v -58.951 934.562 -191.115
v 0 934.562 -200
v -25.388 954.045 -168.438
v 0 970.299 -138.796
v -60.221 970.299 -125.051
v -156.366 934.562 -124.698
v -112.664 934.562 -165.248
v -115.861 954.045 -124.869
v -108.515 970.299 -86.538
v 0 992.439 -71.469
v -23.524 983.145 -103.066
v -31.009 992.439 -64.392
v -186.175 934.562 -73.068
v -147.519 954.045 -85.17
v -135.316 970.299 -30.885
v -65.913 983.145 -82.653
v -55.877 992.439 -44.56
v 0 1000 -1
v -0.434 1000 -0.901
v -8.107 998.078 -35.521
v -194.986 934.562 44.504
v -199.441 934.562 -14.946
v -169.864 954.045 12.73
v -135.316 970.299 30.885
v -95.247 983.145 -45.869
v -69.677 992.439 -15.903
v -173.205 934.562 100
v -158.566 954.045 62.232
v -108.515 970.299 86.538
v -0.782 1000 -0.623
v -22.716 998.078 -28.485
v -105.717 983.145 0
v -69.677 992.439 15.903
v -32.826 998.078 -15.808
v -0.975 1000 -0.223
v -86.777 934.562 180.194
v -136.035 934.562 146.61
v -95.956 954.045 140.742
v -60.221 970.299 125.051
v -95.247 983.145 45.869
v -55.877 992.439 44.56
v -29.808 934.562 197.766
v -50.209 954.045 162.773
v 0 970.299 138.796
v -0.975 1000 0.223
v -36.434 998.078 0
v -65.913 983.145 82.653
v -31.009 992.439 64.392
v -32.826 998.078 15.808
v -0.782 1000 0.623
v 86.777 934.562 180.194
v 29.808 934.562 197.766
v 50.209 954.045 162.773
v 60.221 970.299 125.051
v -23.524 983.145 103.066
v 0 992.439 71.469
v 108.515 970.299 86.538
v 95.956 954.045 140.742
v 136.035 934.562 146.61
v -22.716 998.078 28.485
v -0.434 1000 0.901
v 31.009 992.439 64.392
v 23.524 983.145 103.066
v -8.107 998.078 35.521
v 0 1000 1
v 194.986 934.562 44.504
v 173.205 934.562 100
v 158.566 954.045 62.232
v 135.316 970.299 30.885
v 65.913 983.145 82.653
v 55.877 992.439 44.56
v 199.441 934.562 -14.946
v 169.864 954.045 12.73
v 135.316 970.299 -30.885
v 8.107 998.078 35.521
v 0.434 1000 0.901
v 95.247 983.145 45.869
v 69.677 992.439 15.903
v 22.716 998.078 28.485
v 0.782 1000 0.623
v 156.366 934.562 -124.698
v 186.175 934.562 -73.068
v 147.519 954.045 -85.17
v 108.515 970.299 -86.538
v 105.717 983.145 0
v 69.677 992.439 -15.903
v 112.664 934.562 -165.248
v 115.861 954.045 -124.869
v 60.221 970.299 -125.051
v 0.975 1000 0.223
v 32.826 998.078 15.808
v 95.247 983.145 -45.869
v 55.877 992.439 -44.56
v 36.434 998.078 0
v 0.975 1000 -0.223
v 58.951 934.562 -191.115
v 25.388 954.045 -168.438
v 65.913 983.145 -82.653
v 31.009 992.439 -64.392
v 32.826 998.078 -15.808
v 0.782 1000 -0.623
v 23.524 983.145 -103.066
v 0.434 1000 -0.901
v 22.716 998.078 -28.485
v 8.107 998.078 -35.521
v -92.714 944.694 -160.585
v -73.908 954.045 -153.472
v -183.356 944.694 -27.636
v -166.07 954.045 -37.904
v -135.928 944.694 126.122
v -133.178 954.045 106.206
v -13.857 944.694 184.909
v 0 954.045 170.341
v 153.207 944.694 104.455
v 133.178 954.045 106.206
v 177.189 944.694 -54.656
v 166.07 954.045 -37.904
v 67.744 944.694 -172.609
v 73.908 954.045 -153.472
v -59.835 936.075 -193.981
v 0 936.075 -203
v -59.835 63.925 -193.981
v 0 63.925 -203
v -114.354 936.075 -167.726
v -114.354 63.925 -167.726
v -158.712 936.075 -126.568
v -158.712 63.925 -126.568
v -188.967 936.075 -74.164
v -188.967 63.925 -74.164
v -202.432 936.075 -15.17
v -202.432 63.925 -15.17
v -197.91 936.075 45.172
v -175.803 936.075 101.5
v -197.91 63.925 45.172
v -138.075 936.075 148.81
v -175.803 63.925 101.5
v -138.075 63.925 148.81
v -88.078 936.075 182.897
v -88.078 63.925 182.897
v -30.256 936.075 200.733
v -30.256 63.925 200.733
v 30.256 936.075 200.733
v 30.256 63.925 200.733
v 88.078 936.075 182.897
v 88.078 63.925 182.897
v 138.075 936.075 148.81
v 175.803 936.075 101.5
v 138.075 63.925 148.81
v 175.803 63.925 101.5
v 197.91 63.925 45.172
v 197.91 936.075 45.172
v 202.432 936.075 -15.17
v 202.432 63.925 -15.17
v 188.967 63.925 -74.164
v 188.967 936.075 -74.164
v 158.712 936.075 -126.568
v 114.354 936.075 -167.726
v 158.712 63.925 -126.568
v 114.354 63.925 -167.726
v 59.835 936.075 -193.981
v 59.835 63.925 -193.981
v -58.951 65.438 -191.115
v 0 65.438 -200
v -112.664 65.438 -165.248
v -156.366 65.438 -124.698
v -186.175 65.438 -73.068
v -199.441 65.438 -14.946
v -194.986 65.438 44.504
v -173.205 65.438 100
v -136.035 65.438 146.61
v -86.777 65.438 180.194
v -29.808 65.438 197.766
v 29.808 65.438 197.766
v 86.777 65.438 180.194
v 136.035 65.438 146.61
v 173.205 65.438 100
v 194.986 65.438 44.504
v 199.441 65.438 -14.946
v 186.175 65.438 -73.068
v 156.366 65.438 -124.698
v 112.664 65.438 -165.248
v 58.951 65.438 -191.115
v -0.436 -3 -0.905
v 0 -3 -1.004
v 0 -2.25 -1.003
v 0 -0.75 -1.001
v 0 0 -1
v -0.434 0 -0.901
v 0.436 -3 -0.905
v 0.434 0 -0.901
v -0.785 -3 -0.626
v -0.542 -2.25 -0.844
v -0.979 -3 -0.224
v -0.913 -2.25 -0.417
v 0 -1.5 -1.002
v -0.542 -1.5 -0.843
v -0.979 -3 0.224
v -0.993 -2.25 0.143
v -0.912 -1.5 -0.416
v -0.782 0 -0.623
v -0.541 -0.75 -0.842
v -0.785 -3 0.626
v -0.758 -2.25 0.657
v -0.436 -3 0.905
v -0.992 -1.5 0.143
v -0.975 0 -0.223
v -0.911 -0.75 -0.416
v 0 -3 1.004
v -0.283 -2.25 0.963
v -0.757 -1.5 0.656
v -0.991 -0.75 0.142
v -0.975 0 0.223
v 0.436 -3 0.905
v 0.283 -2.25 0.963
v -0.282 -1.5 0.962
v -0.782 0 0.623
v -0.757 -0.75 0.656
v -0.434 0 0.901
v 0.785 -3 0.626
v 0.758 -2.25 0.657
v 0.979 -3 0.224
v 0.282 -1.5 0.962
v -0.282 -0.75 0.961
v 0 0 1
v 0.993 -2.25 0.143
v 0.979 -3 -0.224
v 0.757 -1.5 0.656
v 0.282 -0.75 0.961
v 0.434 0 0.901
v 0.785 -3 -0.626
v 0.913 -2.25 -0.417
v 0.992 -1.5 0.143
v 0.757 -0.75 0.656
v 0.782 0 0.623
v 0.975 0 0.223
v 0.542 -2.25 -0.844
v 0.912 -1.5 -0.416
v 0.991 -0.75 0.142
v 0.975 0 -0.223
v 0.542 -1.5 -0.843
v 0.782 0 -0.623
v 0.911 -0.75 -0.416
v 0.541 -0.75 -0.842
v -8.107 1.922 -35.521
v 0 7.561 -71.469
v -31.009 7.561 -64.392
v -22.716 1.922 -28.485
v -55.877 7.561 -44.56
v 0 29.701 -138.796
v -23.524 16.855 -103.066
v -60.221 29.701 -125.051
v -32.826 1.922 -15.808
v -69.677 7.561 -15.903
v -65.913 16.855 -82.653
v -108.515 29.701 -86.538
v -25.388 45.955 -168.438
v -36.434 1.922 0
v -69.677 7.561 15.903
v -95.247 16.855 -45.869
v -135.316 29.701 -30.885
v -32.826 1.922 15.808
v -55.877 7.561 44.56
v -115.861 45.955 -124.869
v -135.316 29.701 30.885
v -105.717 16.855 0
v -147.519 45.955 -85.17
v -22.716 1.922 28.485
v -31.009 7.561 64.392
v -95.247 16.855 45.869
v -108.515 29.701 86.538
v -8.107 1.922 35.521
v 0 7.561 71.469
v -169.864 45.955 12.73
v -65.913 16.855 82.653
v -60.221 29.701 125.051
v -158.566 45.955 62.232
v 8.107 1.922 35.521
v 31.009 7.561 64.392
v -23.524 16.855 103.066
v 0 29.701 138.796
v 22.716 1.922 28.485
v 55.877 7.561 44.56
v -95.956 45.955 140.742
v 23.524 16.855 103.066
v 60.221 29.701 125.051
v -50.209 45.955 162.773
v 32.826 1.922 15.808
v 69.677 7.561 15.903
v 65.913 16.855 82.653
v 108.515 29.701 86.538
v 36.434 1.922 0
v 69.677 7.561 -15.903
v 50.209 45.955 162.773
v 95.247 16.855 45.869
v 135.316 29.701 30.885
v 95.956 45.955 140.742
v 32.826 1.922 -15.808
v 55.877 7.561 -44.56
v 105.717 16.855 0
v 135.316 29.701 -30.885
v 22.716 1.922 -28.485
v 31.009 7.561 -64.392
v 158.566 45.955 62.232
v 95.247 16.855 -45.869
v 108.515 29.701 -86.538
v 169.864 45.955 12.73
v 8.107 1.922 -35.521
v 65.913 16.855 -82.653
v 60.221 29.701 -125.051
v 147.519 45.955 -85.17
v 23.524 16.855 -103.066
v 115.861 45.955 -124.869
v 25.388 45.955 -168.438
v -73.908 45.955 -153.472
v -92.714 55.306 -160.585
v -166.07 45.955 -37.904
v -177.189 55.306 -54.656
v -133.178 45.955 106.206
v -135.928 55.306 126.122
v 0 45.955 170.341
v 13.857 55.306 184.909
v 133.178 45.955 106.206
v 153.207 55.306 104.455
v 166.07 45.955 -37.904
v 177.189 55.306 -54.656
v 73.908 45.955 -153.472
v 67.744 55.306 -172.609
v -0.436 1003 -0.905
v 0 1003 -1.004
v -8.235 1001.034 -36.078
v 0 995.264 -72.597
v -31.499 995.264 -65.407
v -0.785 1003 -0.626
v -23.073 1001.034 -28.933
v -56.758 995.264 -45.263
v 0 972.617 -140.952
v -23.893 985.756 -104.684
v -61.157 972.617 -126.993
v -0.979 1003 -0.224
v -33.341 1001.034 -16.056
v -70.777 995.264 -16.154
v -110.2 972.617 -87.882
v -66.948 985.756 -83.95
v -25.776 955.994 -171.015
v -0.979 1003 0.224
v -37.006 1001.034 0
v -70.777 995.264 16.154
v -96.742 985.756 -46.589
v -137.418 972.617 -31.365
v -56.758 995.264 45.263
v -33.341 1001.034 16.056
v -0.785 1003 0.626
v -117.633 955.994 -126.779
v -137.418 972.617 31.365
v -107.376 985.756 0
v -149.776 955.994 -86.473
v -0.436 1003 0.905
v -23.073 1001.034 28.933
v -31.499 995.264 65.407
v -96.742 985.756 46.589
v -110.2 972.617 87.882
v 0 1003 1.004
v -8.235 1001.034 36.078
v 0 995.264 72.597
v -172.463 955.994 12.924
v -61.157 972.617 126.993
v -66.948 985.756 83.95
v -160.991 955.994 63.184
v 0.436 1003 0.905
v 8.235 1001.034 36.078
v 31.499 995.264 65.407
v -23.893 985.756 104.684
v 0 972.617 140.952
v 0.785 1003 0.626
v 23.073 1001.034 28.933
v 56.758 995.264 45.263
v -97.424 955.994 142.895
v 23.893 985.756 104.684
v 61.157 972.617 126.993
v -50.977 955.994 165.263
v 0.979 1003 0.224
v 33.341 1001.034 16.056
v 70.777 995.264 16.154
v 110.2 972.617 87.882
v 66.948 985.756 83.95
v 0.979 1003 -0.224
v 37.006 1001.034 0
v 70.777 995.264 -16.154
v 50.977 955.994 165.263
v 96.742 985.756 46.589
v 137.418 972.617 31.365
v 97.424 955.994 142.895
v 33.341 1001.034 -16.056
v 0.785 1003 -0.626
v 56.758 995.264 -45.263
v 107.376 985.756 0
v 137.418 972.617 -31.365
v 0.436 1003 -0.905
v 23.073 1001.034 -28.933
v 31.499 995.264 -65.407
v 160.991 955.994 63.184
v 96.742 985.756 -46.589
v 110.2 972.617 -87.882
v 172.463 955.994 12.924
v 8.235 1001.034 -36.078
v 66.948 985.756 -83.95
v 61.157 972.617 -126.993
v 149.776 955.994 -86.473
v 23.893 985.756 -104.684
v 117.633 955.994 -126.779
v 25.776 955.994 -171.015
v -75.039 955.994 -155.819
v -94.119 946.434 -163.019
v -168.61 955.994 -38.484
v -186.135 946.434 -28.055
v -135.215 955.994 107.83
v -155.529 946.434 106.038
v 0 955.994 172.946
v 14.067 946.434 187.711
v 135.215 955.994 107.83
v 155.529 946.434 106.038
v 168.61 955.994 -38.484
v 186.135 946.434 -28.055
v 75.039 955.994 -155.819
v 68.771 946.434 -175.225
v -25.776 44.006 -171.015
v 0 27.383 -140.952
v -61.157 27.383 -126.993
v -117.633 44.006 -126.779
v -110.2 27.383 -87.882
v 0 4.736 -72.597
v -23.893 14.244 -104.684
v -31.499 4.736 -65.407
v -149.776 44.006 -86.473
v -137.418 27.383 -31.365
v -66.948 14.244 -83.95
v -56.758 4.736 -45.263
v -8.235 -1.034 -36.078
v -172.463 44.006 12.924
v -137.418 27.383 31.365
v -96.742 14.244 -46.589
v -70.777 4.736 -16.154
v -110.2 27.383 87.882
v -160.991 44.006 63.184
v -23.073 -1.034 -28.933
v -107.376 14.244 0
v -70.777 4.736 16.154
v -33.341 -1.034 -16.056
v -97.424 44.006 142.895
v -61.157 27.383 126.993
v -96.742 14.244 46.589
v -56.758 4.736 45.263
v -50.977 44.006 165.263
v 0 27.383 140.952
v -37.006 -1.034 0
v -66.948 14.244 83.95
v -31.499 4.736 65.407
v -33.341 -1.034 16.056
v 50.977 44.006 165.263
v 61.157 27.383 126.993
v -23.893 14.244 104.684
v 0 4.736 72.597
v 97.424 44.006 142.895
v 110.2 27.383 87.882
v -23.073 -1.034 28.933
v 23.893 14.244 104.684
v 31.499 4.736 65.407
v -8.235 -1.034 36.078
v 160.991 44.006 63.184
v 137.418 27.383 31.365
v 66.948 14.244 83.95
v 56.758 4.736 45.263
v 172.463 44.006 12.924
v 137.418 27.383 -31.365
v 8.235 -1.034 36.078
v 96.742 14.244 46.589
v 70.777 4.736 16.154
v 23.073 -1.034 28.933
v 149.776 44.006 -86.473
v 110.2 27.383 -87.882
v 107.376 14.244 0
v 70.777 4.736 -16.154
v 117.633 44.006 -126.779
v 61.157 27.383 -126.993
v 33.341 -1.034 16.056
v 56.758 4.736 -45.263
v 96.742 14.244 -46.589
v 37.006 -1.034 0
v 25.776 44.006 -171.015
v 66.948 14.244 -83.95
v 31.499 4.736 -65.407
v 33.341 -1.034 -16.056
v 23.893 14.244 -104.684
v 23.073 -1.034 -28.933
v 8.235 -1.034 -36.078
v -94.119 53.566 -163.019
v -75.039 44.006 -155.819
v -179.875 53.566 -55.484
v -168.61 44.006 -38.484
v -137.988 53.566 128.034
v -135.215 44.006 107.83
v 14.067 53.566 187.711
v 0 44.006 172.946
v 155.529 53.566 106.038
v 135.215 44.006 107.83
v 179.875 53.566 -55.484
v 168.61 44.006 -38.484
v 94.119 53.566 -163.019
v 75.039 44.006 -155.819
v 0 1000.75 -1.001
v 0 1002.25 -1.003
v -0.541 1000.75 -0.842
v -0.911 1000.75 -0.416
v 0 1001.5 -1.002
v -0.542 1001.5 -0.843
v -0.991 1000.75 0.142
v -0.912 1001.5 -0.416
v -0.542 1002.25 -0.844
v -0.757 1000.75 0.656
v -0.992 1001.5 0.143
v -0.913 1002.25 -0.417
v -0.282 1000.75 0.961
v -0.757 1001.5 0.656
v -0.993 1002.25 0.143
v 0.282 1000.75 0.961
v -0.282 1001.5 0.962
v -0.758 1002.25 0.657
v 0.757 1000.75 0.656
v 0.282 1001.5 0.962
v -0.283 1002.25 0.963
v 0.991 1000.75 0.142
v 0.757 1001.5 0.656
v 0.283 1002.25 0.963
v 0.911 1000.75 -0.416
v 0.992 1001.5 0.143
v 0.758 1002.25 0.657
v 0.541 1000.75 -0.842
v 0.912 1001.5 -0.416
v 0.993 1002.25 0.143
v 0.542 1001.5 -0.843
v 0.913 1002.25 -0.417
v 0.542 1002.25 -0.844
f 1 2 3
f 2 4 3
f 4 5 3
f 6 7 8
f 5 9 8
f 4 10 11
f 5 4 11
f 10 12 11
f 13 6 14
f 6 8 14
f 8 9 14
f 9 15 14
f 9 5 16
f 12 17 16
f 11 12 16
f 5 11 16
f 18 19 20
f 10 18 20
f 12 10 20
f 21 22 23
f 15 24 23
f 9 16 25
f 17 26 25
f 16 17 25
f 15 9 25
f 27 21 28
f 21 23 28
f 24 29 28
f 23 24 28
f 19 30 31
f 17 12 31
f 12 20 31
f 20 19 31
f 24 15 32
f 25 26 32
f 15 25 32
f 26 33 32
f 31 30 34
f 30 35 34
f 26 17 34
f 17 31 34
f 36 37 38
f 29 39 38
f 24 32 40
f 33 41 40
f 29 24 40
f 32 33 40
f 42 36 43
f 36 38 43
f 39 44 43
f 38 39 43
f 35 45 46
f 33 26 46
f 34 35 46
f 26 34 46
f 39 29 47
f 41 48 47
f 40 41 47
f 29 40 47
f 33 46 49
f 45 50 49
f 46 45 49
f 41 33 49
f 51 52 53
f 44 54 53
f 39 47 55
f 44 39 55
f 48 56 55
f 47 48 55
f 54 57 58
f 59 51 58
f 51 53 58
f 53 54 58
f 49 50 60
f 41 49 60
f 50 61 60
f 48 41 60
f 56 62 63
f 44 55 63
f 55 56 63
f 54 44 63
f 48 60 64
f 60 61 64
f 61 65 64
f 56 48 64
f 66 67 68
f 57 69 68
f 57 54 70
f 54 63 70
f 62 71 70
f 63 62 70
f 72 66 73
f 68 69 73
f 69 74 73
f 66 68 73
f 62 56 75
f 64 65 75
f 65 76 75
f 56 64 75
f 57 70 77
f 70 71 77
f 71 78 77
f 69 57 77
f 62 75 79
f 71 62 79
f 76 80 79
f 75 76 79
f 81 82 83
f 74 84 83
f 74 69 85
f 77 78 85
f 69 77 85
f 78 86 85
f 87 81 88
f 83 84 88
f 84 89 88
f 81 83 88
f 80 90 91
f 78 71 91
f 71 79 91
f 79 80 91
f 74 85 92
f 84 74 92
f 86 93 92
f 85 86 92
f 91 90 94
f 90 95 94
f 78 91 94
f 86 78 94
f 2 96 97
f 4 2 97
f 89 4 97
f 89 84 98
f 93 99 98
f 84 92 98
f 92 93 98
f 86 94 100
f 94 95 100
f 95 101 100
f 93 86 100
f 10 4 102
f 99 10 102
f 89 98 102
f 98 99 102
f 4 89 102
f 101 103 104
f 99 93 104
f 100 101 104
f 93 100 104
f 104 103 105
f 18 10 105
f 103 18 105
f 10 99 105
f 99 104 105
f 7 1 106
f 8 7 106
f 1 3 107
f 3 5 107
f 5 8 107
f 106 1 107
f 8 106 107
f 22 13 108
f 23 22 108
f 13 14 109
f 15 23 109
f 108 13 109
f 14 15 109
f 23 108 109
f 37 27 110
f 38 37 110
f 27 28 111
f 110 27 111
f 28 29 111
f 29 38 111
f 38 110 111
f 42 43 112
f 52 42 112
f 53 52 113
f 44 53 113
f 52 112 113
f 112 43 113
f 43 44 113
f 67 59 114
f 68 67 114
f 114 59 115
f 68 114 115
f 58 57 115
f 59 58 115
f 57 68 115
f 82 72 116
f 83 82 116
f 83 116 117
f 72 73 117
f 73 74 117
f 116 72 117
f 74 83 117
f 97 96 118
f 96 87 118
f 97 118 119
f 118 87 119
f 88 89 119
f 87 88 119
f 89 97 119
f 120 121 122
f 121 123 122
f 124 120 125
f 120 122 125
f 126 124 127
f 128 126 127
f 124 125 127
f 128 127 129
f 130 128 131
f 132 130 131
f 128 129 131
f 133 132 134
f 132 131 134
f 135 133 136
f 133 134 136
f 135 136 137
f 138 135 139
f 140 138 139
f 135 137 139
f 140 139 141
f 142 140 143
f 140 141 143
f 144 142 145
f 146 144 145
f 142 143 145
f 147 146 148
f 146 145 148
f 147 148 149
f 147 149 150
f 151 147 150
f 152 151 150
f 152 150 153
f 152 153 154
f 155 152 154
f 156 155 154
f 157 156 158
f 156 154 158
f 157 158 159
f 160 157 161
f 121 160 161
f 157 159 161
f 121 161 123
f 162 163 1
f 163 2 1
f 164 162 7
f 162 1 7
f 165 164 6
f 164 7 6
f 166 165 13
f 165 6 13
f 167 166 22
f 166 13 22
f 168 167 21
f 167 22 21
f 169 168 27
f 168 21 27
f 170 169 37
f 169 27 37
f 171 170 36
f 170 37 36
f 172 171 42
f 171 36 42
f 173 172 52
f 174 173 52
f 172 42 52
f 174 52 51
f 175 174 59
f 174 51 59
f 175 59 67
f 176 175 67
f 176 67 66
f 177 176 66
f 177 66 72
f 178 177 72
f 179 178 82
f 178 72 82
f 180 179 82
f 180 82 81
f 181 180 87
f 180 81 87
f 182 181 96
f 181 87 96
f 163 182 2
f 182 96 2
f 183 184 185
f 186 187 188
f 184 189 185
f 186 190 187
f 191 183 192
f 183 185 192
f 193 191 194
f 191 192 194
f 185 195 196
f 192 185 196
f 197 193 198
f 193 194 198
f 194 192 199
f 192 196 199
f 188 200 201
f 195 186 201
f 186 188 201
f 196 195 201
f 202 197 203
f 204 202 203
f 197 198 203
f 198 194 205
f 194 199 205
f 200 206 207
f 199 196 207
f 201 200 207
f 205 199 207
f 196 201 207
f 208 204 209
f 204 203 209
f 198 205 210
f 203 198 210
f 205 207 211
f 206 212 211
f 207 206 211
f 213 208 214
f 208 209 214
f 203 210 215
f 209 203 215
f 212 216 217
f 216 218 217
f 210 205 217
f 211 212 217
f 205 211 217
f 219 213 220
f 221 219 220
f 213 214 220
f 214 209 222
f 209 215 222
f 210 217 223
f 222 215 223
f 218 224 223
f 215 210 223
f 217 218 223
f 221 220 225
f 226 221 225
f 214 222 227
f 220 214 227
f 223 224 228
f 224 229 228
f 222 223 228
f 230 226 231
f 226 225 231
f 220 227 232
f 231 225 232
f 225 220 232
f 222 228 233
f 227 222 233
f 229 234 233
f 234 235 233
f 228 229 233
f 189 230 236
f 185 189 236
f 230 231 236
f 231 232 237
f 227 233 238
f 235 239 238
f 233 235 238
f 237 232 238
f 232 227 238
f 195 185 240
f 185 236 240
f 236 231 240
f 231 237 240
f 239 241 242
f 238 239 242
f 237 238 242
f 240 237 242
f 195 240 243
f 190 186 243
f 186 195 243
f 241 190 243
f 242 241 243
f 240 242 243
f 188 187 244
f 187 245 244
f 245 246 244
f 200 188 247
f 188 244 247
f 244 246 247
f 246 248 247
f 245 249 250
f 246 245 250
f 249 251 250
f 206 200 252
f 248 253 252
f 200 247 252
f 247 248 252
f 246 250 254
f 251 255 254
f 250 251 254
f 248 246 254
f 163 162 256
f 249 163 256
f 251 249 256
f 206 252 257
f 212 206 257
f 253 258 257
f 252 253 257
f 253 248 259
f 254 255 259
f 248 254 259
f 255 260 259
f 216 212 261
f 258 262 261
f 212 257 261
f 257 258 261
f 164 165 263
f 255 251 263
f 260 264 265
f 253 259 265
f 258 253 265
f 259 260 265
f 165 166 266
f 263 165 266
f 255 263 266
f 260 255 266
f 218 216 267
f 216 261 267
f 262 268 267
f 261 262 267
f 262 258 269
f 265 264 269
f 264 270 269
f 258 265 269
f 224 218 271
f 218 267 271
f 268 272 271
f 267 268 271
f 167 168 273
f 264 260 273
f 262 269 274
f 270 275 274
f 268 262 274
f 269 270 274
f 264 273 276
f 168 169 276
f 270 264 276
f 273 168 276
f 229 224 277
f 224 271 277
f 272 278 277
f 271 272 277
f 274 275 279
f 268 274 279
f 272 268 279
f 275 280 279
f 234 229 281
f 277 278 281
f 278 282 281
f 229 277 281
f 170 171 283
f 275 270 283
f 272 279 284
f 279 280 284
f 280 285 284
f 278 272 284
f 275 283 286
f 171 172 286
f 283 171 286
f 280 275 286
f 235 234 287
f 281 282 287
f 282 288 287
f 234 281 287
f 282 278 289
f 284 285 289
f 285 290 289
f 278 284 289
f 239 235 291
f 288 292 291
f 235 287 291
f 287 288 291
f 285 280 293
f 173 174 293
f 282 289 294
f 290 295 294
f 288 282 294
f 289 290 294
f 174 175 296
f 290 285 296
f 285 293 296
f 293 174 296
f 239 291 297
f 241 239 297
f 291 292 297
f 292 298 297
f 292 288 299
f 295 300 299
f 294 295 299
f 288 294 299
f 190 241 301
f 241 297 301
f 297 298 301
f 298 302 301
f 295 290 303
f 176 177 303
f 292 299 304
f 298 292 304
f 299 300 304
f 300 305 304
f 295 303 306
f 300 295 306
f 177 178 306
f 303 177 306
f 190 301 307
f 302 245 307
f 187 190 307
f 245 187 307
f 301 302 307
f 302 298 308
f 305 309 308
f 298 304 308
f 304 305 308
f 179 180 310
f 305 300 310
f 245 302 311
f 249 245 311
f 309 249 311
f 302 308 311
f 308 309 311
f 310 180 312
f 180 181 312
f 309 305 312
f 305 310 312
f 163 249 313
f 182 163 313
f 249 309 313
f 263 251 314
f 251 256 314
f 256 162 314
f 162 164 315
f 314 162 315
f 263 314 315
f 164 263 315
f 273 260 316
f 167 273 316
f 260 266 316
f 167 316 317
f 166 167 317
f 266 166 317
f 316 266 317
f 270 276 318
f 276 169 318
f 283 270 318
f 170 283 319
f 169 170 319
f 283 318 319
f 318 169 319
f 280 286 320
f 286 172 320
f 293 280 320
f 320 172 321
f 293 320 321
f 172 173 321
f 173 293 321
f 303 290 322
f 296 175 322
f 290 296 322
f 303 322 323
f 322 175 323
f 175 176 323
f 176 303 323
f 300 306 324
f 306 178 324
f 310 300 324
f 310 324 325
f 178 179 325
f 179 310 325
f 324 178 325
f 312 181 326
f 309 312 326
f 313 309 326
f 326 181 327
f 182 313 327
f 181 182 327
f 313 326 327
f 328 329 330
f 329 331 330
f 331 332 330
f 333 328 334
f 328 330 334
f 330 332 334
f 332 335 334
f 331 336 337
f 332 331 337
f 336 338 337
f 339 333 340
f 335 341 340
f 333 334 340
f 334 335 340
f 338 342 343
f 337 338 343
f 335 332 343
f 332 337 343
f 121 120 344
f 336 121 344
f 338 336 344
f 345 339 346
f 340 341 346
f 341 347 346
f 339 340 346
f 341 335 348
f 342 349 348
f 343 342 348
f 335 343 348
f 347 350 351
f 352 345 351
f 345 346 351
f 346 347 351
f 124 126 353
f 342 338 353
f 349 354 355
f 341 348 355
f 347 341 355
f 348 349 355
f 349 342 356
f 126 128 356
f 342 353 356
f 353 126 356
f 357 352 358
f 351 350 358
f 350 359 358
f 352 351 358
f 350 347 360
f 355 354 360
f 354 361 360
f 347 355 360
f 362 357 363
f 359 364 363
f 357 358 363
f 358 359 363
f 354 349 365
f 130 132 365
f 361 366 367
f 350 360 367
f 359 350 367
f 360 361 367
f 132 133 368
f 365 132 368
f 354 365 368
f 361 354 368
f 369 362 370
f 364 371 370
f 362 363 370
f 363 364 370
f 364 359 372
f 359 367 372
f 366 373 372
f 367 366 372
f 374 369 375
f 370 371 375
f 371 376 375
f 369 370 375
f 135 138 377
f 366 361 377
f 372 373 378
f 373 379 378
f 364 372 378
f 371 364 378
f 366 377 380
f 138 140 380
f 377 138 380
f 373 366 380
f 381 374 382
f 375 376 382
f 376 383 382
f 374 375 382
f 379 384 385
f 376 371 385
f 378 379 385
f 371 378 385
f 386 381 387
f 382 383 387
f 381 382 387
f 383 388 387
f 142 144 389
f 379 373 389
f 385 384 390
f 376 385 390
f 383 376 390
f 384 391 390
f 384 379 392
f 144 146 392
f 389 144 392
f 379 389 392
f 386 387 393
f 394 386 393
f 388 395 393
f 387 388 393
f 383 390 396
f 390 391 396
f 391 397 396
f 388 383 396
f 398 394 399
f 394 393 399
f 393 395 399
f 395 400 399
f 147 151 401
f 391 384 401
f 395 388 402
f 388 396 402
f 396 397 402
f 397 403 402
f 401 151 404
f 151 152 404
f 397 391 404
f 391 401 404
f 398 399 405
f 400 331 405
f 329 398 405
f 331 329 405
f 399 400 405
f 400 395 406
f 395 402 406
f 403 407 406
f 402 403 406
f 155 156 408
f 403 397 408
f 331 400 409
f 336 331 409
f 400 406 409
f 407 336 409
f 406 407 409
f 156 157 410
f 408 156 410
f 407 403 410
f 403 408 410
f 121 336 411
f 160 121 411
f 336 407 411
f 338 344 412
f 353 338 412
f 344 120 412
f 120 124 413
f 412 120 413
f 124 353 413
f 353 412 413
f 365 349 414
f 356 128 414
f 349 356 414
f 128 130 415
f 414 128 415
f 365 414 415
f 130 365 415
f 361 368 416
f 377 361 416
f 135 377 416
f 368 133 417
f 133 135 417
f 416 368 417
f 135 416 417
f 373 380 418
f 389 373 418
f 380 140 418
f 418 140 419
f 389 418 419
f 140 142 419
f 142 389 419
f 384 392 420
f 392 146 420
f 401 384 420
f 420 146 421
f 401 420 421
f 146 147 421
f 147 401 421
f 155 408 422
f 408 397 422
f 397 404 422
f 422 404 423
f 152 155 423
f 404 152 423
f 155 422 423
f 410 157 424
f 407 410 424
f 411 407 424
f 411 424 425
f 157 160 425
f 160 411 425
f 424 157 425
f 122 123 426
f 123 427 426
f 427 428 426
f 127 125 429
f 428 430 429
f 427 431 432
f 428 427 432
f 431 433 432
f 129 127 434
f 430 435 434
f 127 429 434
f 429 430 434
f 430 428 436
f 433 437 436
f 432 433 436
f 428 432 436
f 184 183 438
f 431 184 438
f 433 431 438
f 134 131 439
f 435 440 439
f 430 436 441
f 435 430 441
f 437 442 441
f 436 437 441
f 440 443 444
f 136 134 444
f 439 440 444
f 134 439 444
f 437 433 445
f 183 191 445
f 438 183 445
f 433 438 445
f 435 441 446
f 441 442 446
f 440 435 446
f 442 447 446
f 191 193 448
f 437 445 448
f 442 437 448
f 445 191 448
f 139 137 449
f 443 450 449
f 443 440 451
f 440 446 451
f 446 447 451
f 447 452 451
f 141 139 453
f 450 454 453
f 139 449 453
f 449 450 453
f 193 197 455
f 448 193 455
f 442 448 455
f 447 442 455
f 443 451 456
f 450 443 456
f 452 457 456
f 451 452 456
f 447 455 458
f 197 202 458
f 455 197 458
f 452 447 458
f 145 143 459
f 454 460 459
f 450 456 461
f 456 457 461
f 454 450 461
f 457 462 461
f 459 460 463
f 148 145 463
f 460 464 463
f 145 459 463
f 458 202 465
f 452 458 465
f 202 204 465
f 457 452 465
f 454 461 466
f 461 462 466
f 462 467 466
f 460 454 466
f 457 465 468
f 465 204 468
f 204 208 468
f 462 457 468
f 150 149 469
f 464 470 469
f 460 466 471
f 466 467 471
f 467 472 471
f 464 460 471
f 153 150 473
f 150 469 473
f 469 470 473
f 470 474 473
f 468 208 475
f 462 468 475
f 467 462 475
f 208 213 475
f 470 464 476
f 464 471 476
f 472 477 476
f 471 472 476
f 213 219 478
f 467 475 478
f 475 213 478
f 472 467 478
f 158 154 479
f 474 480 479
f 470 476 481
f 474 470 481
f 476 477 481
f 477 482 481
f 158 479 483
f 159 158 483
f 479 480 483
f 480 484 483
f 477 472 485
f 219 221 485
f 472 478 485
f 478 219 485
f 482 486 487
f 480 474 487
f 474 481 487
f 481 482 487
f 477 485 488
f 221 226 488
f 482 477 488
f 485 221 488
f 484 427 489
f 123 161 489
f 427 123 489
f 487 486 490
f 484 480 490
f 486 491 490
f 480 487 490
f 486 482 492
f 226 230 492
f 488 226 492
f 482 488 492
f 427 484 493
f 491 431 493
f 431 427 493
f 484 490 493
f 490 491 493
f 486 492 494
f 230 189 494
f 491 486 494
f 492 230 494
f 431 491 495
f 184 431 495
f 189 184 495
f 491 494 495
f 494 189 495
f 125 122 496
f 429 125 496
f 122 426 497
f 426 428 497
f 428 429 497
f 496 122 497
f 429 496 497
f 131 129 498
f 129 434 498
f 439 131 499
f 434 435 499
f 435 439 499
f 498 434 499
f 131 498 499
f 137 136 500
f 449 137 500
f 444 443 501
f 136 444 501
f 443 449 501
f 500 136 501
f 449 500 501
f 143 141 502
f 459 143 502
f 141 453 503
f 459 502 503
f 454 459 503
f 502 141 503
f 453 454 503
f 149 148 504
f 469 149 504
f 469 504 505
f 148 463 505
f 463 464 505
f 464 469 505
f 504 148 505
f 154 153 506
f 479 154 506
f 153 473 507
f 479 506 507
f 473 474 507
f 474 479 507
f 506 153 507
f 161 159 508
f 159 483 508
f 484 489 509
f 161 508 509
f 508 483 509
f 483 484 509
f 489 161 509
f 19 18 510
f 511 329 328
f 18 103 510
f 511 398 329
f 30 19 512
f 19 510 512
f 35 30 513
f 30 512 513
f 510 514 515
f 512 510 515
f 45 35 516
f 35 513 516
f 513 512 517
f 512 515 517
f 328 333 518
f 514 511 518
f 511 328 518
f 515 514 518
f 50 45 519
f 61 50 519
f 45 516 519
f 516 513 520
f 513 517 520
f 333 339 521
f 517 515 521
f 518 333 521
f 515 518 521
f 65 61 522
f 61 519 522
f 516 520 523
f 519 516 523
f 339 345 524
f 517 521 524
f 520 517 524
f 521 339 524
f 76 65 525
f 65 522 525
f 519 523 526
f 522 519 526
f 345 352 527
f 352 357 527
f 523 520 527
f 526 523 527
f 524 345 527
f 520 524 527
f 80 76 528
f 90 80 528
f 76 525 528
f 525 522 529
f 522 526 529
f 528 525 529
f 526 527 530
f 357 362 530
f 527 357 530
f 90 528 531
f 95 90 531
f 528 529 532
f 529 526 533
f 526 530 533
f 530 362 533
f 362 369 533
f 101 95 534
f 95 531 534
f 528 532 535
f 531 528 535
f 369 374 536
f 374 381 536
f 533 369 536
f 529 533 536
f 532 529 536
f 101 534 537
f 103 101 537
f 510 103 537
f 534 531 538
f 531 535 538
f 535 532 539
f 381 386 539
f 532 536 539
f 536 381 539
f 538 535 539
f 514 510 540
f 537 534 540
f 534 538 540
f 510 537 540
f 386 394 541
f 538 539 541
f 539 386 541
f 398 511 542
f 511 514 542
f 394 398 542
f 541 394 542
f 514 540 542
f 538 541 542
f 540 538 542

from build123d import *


with BuildPart() as part:
    # Эскиз1 → Повернуть-Тонкостенный3 (revolve)
    with BuildSketch(Plane(origin=(0, 0, 0), x_dir=(0, 0, -1), z_dir=(1, 0, 0))):
        with BuildLine():
            ThreePointArc((1, 0), (105.7166575, 16.855175566), (200, 65.438368426))
            Line((200, 65.438368426), (200, 934.561631574))
            ThreePointArc((200, 934.561631574), (105.7166575, 983.144824434), (1, 1000))
            Line((1, 1000), (1.004453384, 1002.999996695))
            ThreePointArc((1.004453384, 1002.999996695), (107.375751508, 985.756396385), (203, 936.075435077))
            Line((203, 936.075435077), (203, 63.924564923))
            ThreePointArc((203, 63.924564923), (107.375751508, 14.243603615), (1.004453384, -2.999996695))
            Line((1.004453384, -2.999996695), (1, 0))
        make_face()
    revolve(axis=Axis((0, -42.73513709, 0), (0, 1, 0)))


solid = part.part
